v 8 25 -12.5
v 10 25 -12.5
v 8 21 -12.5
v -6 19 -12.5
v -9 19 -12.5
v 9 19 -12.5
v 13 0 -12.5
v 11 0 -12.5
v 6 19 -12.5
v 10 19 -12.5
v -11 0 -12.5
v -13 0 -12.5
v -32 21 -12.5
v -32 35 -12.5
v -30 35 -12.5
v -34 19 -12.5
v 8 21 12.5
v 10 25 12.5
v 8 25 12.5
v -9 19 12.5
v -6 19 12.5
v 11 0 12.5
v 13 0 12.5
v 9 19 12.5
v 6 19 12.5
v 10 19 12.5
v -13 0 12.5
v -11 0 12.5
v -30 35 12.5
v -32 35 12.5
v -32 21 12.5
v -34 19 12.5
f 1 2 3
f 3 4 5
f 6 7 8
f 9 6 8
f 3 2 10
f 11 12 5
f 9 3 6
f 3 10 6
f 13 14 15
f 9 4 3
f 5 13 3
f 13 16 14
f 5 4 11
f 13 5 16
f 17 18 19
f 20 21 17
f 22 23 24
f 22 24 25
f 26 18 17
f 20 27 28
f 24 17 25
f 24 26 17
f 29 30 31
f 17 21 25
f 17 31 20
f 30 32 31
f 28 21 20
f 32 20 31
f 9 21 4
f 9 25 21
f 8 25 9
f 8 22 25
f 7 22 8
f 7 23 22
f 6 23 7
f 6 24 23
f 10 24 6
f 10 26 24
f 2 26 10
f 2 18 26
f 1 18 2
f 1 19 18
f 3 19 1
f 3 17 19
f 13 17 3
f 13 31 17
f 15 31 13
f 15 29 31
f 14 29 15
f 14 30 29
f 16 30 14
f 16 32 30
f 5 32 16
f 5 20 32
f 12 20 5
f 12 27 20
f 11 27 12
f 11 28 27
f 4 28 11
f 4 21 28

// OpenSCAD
 linear_extrude(height = 25, center = true, convexity = 10, twist = 0)
  polygon( points=[ 
  [-11,0],
  [-13,0],
  [-9,19],
  [-40+6+0*12+0,19+0],
  [-40+6+0*12+2,35+0],
  
  [-38+6+0*12+2,35+0],
  [-38+6+0*12+0,21+0],
  [38-30+0*12+0,21],
  [38-30+0*12+0,35-10],
  [40-30+0*12,35-10],
  
  [40-30+0*12,19],
  [9,19],
  [13,0],
  [11,0],
  [6,19],
  
  [-6,19]],
  
  paths=[[0,1,2,3,4,5,6,7,8,9,10,11,12,13,14,15]],
  convexity=10);
  
  
